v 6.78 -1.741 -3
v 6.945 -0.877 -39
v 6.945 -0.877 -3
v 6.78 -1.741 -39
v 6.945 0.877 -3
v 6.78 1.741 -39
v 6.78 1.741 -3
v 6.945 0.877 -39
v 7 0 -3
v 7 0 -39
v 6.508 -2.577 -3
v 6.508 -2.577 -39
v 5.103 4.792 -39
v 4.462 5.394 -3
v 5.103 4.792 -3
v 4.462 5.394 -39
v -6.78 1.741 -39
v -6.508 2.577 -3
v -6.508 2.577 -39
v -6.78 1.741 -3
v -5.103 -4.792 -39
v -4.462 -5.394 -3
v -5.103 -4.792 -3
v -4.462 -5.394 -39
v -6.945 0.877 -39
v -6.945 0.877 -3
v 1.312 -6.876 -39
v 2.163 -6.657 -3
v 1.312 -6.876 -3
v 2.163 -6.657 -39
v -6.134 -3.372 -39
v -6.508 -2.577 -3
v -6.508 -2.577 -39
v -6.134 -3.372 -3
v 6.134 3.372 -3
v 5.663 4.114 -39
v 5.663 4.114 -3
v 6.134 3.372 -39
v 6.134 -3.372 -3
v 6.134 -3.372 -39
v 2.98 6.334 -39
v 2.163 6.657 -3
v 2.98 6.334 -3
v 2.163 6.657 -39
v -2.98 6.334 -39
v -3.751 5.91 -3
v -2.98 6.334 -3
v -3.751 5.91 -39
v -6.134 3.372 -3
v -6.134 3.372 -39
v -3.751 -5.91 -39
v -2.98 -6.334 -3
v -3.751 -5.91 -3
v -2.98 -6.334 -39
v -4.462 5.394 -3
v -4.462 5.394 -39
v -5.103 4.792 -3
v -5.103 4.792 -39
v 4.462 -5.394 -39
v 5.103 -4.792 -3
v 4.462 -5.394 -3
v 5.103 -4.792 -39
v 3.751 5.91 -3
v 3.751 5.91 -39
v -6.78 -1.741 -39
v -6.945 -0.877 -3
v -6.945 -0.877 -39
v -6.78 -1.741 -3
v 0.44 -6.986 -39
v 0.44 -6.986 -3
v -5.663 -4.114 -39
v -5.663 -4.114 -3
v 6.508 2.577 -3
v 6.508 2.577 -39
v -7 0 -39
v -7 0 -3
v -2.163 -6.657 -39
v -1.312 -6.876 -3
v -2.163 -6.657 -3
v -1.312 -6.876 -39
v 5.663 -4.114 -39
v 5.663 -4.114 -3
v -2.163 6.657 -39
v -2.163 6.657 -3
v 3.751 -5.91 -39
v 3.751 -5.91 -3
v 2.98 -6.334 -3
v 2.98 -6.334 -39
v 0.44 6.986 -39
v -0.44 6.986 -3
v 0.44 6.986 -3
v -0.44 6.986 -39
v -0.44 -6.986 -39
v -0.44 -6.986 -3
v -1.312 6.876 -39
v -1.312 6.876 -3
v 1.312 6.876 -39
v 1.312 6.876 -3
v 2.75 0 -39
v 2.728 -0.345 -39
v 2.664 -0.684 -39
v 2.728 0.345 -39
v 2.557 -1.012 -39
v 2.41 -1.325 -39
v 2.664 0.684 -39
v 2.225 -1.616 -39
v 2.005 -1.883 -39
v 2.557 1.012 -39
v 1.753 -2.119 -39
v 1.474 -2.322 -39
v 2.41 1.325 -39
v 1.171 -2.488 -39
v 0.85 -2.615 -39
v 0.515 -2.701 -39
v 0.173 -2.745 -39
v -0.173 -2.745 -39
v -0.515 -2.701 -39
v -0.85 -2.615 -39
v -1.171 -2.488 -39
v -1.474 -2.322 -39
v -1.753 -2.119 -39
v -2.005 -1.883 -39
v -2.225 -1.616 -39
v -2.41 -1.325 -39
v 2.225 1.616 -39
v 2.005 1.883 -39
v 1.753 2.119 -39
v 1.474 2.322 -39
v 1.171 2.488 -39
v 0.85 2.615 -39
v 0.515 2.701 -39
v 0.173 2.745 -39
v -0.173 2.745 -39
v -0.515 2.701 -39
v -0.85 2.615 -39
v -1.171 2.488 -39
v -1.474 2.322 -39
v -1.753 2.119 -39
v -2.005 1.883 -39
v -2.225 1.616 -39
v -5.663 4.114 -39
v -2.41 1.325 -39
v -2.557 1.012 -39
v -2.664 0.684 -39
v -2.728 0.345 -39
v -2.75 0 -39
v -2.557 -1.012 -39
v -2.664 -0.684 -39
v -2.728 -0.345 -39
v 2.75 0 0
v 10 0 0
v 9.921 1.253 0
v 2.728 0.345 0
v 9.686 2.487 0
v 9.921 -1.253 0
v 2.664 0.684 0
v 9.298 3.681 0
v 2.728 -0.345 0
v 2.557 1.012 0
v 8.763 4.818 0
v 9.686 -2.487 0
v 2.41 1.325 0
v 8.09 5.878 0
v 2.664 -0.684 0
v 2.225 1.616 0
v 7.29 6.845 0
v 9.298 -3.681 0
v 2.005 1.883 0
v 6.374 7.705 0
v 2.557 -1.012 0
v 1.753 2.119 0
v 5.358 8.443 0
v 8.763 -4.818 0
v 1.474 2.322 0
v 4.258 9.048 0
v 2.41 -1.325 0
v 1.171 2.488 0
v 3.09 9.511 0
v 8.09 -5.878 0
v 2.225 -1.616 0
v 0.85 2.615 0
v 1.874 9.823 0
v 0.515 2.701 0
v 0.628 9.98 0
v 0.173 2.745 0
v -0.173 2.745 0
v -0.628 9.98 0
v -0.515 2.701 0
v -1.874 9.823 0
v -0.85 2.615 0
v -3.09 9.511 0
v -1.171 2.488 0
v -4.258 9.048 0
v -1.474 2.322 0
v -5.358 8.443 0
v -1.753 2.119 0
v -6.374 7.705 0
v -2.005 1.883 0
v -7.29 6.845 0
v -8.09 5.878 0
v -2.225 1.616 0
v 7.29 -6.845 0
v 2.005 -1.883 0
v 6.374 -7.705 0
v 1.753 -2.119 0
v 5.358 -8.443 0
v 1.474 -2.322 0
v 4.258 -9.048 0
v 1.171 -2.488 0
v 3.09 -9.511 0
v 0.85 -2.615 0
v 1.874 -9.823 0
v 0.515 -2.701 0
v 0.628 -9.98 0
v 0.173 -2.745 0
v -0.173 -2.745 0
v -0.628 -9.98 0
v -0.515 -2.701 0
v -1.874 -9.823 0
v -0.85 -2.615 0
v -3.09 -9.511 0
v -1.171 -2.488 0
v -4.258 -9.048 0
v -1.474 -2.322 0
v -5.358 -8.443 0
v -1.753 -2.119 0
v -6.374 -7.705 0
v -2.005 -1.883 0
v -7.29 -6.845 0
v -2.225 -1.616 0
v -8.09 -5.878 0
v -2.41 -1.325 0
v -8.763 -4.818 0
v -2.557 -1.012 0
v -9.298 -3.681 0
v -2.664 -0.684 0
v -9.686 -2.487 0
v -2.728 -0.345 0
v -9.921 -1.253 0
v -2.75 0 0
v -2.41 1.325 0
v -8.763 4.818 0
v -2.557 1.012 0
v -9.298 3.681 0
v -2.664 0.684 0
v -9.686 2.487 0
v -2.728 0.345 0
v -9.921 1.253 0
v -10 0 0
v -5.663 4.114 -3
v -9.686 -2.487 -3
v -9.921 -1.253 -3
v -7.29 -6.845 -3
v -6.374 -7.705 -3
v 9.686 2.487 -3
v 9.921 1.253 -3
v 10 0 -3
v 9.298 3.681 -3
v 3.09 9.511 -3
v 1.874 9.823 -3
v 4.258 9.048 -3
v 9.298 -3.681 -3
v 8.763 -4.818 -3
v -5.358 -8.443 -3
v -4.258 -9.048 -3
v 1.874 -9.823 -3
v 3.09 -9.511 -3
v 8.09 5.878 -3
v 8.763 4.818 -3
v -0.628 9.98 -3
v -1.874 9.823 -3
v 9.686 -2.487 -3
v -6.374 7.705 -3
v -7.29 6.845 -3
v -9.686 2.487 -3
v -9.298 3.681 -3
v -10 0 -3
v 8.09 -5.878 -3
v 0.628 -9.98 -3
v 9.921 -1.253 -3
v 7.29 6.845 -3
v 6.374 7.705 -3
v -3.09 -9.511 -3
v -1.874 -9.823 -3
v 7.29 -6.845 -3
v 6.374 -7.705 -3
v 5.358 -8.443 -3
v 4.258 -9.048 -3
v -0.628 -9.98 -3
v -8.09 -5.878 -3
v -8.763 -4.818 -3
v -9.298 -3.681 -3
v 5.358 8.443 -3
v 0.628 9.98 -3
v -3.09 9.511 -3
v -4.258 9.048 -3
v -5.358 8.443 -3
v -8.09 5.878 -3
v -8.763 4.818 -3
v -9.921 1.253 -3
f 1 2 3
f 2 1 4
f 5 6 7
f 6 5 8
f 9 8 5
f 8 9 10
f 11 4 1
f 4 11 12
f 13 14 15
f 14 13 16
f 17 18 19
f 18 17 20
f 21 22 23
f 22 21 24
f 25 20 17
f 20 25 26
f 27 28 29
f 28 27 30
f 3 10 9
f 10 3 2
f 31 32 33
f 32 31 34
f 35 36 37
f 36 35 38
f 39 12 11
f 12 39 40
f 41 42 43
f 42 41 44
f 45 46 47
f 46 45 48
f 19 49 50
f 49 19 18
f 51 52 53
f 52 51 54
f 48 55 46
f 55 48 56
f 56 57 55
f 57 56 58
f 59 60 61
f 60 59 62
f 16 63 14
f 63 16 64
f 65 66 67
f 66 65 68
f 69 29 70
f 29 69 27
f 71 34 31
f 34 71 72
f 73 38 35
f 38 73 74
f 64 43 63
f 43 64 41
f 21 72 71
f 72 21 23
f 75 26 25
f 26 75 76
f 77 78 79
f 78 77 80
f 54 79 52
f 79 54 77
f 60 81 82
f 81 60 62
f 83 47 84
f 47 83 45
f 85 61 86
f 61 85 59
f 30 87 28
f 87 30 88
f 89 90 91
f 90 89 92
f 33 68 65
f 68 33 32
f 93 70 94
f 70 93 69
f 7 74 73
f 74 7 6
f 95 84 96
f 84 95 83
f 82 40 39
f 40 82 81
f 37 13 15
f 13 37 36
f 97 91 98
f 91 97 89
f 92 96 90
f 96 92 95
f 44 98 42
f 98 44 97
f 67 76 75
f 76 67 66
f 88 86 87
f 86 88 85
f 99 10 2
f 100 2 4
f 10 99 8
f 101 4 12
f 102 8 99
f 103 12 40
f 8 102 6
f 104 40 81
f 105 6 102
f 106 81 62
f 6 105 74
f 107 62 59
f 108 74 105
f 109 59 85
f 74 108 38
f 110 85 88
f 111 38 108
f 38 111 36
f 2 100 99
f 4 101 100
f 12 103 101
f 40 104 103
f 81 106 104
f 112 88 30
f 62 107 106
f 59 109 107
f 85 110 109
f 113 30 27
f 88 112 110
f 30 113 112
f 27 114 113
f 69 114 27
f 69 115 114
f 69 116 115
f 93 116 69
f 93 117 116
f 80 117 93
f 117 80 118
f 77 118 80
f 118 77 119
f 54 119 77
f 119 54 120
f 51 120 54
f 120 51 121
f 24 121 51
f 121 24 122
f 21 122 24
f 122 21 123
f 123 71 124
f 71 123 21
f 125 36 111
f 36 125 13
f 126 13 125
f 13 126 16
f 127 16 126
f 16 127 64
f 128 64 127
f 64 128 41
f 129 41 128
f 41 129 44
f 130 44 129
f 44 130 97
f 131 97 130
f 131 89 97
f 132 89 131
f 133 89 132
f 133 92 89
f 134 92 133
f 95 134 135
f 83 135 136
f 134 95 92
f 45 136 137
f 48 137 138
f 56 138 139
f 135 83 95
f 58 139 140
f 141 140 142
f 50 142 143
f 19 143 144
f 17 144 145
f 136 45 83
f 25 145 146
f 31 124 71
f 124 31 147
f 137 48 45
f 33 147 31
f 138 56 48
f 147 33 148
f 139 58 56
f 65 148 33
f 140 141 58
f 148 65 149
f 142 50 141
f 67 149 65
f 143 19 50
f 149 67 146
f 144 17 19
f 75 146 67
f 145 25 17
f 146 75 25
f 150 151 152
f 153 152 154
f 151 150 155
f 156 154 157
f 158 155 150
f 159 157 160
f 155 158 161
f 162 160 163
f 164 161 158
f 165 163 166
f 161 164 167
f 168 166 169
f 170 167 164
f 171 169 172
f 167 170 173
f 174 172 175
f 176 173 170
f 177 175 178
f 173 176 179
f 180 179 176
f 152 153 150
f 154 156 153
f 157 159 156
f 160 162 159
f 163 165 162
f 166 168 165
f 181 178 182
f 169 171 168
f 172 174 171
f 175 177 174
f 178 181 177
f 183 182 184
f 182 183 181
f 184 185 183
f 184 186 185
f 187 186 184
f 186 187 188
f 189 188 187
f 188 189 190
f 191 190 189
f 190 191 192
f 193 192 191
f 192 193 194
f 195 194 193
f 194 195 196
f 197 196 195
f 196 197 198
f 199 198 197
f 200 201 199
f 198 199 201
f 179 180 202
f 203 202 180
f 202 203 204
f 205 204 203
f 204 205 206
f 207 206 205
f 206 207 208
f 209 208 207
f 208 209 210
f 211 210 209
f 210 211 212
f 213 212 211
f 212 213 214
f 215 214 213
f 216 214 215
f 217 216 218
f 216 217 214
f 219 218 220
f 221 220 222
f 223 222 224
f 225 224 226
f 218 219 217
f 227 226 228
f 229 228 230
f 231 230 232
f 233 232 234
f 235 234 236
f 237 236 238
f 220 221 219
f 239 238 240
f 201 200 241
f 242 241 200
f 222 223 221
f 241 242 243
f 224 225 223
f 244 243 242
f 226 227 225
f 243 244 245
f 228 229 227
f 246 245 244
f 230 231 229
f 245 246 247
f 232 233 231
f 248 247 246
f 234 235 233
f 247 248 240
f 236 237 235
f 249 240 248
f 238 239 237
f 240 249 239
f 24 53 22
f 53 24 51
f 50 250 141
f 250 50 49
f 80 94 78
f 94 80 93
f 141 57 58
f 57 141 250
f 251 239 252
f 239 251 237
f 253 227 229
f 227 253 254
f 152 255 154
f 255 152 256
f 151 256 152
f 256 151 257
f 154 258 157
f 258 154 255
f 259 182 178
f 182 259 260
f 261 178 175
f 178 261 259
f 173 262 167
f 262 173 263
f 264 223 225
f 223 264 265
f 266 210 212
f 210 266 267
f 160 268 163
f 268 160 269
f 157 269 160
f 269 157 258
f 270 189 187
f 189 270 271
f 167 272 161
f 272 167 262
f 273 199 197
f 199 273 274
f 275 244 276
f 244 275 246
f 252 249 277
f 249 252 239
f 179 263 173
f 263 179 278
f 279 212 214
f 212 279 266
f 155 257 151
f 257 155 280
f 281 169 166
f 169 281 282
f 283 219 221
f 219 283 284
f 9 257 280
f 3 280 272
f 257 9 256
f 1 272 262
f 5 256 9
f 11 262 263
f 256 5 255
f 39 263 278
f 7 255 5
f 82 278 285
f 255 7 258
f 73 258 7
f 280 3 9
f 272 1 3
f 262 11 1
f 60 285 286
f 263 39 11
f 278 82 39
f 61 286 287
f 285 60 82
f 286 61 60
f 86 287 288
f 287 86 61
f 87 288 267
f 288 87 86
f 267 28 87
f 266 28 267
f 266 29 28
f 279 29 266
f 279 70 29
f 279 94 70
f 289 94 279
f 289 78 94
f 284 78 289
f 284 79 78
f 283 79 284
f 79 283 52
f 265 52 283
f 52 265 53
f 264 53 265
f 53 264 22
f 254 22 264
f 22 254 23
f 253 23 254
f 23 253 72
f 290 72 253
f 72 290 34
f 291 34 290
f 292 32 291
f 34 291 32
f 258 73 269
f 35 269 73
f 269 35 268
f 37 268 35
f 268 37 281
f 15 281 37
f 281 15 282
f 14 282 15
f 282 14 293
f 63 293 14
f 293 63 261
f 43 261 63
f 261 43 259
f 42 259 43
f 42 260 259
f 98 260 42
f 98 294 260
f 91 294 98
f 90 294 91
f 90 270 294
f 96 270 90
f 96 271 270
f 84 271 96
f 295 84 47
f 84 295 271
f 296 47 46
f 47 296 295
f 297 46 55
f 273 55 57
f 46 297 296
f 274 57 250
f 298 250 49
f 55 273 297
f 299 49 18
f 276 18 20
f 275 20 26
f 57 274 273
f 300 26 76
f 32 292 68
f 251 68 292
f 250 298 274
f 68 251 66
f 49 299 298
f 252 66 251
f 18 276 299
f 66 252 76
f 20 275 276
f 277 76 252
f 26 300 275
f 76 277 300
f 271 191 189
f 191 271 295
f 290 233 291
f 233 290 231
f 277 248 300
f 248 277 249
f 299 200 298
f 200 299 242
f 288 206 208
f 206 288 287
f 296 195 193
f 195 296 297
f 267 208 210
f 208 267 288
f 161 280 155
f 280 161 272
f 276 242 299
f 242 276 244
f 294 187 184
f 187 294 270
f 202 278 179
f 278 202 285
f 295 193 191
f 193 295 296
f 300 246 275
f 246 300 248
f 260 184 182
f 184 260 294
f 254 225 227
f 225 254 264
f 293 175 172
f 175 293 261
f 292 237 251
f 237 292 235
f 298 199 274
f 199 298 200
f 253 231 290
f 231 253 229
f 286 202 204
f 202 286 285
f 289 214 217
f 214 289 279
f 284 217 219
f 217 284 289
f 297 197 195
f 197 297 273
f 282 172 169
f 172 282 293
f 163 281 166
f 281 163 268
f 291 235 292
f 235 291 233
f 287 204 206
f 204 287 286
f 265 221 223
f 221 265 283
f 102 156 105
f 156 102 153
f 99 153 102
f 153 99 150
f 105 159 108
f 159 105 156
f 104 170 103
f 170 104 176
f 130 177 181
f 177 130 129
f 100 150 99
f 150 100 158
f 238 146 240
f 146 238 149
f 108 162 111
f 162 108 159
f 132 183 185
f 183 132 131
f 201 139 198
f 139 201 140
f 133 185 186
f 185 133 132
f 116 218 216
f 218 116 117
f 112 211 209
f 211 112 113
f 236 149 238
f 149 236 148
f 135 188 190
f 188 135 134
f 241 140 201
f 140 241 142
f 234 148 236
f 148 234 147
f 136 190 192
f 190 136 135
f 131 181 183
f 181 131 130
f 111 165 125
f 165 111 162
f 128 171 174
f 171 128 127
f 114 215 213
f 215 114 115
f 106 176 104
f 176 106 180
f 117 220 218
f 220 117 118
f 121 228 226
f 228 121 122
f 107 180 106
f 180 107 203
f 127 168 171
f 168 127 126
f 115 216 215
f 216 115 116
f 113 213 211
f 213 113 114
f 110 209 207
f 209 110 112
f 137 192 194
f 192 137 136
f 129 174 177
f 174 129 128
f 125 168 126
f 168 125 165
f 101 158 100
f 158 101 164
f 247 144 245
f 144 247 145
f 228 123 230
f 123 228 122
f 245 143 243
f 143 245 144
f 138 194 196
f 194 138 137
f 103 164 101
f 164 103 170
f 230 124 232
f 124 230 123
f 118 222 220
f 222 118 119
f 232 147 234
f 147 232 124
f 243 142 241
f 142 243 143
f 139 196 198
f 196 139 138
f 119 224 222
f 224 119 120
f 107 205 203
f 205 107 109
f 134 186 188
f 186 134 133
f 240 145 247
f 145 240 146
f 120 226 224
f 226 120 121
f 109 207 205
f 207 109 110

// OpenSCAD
$fn = 50;


difference() {
	union() {
		translate(v = [0, 0, -39.0000000000]) {
			cylinder(h = 39, r = 7.0000000000);
		}
		translate(v = [0, 0, -3.0000000000]) {
			cylinder(h = 3, r = 10.0000000000);
		}
	}
	union() {
		#translate(v = [0, 0, -39]) {
			cylinder(h = 39, r = 2.7500000000);
		}
	}
}
